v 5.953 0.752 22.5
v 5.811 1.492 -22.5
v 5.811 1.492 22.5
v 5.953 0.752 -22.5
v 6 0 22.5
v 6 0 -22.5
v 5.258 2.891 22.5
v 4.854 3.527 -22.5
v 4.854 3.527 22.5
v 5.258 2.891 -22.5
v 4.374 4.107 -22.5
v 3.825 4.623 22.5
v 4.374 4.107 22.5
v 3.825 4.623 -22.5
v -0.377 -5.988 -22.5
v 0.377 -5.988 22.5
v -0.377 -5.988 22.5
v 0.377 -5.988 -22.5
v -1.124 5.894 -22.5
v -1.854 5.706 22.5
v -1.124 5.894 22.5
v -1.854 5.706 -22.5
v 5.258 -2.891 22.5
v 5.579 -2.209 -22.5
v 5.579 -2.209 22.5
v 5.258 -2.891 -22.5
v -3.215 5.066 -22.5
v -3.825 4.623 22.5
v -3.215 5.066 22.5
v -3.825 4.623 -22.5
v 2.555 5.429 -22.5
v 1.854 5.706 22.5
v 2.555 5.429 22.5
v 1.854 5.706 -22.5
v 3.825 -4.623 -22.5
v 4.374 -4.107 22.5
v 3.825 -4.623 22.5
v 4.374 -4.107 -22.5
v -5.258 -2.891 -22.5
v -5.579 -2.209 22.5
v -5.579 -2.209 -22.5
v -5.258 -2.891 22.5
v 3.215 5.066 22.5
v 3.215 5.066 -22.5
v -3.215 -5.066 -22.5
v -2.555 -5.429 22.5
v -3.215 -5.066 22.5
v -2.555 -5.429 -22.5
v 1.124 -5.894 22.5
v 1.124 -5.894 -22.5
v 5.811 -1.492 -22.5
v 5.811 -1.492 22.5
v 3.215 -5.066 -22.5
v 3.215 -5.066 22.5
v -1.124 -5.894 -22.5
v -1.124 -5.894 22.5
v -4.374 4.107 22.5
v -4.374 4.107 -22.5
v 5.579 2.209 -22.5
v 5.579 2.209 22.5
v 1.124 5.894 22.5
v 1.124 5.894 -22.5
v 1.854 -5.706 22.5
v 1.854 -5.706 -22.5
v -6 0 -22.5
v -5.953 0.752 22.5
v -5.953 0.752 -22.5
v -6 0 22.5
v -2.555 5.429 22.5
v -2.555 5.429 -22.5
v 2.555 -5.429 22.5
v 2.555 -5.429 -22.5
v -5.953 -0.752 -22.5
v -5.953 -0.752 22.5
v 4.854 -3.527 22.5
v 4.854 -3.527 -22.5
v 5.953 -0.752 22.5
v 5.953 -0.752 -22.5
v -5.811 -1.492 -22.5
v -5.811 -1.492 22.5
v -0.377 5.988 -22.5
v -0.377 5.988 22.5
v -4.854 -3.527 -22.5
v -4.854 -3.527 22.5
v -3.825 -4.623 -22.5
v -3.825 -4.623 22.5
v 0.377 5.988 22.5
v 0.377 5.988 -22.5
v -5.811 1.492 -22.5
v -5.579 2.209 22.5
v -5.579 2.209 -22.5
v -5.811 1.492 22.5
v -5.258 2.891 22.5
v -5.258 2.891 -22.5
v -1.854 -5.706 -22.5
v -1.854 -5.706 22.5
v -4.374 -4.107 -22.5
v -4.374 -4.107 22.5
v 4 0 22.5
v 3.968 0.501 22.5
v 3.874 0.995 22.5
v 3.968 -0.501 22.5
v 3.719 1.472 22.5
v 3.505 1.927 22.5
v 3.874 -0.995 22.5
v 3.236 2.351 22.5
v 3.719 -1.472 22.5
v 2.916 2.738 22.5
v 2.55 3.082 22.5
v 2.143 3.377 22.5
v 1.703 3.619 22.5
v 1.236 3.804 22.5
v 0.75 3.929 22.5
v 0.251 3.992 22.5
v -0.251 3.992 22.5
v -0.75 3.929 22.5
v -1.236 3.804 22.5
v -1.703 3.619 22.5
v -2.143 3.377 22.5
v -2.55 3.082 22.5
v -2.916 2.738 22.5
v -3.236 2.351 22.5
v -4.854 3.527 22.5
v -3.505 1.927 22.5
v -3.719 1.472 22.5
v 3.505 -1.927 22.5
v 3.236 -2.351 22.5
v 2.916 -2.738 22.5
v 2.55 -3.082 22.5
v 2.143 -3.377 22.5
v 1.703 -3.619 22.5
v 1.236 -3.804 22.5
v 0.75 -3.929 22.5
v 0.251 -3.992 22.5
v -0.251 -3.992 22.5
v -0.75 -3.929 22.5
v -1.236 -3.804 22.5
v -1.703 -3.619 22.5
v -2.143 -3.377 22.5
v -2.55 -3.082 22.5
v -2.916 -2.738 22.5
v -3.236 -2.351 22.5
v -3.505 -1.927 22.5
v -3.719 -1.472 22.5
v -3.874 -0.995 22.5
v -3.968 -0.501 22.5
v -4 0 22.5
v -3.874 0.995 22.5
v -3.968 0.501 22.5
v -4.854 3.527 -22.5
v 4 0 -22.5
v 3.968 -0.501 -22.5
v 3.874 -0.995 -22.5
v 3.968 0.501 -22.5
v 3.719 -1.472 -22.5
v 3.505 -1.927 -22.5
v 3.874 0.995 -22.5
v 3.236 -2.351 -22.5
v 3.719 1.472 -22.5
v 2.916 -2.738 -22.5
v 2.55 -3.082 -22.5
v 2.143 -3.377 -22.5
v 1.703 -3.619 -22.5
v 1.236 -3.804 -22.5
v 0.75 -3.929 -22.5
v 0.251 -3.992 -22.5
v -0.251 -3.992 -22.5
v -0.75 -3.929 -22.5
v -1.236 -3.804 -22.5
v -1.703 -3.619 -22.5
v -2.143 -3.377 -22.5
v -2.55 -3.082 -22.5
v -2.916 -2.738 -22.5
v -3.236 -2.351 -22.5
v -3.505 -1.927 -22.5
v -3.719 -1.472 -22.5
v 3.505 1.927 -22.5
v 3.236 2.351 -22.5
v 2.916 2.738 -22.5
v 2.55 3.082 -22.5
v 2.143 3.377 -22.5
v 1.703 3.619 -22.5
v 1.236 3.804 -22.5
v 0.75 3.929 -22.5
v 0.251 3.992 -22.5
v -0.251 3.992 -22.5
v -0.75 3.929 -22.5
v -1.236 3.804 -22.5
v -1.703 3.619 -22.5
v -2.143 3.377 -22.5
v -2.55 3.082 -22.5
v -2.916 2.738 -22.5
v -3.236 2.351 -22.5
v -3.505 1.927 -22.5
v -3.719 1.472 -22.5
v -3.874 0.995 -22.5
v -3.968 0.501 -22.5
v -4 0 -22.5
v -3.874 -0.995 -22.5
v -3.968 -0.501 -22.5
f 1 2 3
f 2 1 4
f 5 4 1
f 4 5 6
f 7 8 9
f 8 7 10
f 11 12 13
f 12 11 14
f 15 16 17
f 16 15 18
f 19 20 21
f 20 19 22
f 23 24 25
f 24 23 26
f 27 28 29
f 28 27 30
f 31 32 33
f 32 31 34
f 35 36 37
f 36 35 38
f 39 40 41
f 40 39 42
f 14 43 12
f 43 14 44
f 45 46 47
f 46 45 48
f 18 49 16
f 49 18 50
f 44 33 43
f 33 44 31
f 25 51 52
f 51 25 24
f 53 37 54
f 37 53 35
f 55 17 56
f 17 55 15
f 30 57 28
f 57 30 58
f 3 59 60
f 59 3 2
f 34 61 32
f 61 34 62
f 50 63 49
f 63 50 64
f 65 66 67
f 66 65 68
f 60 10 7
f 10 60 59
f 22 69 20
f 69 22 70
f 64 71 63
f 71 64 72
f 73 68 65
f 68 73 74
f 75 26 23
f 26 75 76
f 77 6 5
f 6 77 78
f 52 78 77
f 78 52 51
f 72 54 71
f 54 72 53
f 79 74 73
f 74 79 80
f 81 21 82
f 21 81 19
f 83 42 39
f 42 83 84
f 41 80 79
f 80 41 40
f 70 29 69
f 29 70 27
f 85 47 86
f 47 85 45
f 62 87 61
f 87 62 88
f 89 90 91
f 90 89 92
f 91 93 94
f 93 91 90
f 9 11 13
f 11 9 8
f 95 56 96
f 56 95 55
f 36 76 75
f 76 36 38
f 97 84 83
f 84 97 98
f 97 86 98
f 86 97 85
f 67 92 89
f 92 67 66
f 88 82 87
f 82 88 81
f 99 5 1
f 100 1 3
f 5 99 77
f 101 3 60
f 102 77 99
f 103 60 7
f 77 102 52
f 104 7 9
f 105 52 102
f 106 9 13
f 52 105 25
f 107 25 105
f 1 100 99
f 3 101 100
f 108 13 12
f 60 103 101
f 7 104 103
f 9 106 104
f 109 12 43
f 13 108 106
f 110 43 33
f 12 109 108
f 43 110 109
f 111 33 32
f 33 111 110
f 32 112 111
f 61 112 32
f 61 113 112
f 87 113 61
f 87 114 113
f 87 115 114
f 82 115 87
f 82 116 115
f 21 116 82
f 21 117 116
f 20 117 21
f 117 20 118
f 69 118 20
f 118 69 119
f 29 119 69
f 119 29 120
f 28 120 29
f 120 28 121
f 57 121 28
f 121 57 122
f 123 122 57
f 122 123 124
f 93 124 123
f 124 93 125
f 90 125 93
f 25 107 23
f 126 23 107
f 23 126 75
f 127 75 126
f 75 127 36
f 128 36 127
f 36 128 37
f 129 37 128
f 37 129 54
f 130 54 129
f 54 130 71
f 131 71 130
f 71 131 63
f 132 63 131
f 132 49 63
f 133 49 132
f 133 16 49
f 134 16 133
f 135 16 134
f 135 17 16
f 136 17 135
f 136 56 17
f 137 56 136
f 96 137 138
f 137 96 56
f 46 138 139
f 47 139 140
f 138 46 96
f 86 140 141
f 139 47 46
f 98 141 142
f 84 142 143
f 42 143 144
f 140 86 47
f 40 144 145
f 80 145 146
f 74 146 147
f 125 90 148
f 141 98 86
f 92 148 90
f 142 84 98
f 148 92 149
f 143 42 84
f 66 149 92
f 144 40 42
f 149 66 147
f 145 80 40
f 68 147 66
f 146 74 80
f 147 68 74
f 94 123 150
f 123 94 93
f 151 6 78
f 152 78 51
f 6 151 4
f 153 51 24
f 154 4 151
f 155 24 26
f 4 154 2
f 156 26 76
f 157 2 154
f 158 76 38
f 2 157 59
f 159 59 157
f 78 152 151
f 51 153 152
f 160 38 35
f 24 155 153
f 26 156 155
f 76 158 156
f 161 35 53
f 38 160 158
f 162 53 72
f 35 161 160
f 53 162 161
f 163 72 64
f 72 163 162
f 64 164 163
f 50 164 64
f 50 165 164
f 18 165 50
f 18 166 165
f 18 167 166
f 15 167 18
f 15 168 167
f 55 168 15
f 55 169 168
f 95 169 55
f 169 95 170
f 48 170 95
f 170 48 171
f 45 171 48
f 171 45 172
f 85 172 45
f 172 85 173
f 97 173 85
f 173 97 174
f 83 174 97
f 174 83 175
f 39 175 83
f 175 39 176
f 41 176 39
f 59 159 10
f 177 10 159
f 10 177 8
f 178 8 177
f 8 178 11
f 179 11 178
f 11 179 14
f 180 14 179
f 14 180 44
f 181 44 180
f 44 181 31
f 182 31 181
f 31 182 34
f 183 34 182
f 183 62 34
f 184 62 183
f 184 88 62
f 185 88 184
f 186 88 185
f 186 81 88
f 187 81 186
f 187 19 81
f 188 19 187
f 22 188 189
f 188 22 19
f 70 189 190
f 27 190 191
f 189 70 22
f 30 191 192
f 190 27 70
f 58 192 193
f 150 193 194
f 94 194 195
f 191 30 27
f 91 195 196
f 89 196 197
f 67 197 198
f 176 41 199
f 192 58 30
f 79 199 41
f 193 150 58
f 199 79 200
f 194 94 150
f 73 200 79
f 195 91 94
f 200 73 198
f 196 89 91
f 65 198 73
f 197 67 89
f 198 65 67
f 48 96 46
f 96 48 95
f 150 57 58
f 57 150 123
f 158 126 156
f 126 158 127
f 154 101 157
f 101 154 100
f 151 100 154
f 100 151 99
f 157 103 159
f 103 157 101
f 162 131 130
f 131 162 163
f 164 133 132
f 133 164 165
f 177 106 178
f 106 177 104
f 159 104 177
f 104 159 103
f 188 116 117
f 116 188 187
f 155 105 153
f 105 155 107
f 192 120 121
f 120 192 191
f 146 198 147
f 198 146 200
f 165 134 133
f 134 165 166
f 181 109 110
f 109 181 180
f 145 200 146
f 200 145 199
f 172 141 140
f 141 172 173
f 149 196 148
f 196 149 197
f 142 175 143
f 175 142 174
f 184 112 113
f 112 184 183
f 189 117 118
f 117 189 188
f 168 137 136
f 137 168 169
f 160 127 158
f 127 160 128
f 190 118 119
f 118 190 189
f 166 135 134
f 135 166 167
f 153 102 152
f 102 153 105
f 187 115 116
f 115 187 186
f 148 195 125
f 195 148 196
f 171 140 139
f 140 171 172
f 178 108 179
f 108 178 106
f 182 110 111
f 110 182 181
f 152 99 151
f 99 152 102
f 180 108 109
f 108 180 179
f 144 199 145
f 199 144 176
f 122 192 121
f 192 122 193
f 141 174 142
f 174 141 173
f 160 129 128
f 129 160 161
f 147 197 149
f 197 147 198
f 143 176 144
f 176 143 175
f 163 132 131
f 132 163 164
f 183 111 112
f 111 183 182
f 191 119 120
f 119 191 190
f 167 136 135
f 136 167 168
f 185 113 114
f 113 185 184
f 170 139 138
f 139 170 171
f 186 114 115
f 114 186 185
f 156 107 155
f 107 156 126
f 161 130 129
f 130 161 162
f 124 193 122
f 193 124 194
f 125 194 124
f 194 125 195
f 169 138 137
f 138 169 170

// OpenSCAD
$fn = 50;


difference() {
	union() {
		translate(v = [0, 0, -22.5000000000]) {
			cylinder(h = 45, r = 6.0000000000);
		}
	}
	union() {
		translate(v = [0, 0, -100.0000000000]) {
			cylinder(h = 200, r = 4.0000000000);
		}
	}
}
